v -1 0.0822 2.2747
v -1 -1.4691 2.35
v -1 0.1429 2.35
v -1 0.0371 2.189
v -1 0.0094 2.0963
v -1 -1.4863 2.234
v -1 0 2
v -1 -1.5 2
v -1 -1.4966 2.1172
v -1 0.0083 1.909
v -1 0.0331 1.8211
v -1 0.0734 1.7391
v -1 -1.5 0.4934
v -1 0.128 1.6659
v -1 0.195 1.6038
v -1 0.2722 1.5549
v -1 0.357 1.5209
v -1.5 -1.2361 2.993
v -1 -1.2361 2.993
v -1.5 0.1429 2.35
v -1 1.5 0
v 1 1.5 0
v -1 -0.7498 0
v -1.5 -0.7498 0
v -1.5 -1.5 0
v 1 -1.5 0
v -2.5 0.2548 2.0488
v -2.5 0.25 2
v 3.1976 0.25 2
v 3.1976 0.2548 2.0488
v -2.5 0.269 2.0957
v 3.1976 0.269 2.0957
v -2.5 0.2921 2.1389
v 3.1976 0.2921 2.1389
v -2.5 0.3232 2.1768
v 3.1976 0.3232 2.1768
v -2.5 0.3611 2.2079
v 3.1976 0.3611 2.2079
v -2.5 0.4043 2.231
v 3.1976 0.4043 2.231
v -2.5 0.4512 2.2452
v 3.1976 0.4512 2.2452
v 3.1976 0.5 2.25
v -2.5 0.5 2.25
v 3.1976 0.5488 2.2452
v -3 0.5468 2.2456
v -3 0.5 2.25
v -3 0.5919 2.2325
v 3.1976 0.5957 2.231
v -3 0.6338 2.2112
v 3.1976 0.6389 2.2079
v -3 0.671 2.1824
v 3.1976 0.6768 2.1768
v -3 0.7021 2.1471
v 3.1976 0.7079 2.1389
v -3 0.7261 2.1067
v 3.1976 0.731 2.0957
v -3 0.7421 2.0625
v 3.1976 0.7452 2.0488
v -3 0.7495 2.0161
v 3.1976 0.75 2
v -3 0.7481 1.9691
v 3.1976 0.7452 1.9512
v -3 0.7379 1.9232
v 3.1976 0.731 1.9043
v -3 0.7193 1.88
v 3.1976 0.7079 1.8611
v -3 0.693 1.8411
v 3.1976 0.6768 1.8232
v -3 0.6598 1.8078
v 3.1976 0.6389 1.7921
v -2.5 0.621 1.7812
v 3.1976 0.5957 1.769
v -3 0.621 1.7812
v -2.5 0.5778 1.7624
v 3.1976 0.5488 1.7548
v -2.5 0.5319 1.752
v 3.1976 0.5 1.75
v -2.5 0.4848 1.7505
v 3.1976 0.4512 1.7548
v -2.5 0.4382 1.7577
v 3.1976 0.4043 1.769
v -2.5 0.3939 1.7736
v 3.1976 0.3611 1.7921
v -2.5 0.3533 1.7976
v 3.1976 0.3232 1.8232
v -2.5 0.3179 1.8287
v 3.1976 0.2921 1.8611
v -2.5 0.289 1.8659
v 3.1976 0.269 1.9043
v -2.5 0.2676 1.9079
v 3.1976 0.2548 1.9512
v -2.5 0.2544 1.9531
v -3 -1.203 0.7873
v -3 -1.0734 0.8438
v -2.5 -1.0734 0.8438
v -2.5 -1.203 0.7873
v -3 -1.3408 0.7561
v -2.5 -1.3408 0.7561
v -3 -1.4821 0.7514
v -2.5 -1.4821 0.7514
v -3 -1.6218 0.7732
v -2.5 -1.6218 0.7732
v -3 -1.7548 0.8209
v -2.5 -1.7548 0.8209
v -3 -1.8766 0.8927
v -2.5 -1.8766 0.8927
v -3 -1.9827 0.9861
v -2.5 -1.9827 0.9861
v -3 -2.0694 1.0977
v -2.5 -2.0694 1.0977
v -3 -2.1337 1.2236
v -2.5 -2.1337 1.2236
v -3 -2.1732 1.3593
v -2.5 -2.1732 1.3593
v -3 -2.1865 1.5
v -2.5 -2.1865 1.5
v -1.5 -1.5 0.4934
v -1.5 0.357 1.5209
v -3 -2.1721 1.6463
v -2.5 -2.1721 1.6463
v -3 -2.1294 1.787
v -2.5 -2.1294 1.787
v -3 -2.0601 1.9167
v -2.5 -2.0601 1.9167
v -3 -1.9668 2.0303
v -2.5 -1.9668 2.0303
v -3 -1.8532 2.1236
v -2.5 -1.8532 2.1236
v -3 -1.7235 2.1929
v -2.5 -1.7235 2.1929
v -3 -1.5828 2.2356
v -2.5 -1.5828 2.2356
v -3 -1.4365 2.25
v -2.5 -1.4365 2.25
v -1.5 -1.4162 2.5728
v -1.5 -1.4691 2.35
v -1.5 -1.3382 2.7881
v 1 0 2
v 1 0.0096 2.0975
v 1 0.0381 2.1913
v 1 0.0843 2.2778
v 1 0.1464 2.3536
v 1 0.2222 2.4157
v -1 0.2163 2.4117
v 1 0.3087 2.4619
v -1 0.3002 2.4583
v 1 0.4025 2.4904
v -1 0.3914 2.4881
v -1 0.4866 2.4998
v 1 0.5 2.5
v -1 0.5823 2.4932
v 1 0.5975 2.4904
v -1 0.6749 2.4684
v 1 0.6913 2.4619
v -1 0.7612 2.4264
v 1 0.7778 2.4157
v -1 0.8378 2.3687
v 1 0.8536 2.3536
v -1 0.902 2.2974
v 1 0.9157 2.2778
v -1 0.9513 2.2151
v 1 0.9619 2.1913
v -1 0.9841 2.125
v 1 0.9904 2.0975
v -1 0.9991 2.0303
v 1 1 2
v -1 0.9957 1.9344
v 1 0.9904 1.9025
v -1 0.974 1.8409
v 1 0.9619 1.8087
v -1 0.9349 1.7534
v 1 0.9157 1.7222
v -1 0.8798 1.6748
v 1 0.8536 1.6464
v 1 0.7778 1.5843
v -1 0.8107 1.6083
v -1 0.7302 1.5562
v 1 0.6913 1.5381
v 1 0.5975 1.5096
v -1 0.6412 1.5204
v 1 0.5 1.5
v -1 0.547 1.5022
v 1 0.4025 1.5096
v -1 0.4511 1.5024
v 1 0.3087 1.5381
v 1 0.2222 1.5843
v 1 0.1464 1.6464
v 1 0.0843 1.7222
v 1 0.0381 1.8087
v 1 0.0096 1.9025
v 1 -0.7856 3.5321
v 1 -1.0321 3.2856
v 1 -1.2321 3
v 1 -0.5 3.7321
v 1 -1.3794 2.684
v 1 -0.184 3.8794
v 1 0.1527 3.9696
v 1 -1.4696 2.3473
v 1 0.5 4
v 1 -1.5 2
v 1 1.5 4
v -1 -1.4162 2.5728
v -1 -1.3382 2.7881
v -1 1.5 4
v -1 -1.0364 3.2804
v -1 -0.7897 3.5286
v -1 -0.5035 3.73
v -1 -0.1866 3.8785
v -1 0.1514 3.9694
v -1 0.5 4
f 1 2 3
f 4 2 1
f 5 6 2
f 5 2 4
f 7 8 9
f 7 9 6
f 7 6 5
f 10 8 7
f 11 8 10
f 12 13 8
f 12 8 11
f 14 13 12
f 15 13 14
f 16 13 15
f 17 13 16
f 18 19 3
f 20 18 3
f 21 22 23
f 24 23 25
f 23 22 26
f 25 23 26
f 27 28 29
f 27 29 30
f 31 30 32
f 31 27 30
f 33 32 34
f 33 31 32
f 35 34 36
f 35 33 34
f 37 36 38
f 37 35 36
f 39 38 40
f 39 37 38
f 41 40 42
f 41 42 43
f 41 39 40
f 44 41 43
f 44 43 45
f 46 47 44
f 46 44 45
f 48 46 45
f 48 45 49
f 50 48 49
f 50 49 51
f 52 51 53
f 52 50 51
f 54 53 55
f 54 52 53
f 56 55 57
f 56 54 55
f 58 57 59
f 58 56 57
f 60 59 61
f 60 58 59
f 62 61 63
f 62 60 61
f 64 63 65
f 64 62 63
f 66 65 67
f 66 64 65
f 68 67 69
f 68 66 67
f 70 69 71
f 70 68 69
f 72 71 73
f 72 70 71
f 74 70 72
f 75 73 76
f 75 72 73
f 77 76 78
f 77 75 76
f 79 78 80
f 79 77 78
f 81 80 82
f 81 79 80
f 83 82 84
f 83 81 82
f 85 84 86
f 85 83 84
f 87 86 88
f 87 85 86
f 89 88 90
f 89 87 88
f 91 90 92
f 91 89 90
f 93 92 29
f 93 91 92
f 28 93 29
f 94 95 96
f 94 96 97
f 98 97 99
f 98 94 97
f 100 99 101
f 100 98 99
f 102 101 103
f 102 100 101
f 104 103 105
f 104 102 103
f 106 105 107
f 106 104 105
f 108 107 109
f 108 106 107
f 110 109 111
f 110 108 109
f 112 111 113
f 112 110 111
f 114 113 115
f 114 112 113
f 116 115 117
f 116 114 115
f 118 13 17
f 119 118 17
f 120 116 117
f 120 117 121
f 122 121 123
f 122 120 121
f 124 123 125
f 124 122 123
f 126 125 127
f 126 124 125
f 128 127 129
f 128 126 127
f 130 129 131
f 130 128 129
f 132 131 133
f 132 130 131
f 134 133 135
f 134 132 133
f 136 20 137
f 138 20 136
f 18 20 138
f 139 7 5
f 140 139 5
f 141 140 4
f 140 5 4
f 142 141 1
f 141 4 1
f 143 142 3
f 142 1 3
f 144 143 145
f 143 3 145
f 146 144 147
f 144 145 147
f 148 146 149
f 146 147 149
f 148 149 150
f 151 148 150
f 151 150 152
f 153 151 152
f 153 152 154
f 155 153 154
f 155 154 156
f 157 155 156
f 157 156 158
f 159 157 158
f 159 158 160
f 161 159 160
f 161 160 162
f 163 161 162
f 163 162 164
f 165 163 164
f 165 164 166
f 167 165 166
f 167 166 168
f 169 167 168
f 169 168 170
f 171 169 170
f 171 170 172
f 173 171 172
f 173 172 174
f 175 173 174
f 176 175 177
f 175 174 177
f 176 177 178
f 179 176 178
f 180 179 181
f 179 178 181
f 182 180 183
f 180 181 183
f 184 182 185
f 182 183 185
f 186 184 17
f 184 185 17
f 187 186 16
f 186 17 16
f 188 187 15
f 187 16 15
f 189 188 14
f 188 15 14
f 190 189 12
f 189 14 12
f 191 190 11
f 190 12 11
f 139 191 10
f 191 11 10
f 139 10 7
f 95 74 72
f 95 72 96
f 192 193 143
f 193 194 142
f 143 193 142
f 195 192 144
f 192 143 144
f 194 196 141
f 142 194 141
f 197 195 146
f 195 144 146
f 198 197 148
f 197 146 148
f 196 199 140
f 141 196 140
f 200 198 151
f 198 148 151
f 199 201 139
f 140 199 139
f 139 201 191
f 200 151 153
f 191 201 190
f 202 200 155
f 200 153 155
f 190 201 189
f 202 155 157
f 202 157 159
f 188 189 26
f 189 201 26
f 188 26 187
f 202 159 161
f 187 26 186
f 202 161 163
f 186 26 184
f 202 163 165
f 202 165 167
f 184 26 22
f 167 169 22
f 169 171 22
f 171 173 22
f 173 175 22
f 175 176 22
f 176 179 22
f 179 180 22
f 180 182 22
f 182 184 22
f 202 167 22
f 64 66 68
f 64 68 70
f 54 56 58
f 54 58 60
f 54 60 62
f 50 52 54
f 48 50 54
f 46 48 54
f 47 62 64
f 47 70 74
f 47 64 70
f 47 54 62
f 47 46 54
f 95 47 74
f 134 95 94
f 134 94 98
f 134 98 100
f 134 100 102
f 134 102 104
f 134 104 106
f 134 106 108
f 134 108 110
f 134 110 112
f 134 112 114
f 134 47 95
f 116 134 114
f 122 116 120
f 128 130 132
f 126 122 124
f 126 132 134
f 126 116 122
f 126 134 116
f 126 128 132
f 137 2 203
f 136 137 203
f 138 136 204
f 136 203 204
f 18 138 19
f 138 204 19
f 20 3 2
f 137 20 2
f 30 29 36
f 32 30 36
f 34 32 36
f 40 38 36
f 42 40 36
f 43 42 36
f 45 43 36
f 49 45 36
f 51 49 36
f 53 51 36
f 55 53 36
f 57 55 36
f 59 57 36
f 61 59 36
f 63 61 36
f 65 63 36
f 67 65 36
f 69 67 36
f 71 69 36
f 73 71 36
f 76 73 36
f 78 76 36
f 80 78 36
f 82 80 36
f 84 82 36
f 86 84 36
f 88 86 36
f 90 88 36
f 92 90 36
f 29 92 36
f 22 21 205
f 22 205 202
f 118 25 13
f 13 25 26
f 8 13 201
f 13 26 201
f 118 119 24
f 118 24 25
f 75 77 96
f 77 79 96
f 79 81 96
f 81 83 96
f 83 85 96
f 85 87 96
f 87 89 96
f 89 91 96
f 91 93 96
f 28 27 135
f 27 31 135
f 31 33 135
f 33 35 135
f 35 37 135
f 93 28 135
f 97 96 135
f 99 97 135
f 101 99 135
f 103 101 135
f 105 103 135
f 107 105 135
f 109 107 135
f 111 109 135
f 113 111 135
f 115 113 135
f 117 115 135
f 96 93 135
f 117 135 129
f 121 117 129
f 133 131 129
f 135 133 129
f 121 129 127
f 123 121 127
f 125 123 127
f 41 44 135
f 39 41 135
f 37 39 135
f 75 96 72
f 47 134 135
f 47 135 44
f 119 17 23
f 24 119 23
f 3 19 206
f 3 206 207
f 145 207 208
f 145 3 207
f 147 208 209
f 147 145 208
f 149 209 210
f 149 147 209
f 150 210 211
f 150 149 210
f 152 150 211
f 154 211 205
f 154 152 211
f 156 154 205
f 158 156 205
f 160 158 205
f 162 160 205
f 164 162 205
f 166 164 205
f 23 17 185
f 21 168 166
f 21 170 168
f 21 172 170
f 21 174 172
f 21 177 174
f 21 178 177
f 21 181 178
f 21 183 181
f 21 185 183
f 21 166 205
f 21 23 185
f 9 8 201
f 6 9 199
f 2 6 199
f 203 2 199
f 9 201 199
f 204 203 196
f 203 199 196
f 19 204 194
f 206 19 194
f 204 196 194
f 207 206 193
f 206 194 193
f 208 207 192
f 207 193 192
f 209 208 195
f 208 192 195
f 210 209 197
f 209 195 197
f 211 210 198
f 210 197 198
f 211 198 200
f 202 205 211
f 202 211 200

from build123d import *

# Parameters (mm, degrees)
F0_W      = 2
F0_H      = 3
F1_DEPTH  = 4
F2_R      = 2
F3_R      = 0.5
F4_DEPTH  = 2.001
F6_R      = 0.25
F7_DEPTH  = 6.1976
F9_DEPTH  = 0.5
F11_DEPTH = 0.5


with BuildPart() as f1:
    # F0 (on Top) → F1 (new body)
    with BuildSketch(Plane.XY):
        Rectangle(F0_W, F0_H)
    extrude(amount=F1_DEPTH)

    # F2
    f2_edges = [f1.edges().sort_by_distance(p)[0] for p in [
        (0, -1.5, 4),
    ]]
    fillet(f2_edges, radius=F2_R)

    # F3 (on face) → F4 (cut, through all)
    with BuildSketch(Plane(origin=(-1, 0, 0), x_dir=(0, -1, 0), z_dir=(-1, 0, 0))):
        with Locations((-0.5, 2)):
            Circle(F3_R)
    extrude(amount=-F4_DEPTH, mode=Mode.SUBTRACT)

    # F10 (on face) → F11 (join)
    with BuildSketch(Plane(origin=(-1, 0, 0), x_dir=(0, -1, 0), z_dir=(-1, 0, 0))):
        with BuildLine():
            Line((1.2360557408, 2.9930309486), (-0.1429285786, 2.35))
            Line((-0.1429285786, 2.35), (1.4691368668, 2.35))
            ThreePointArc((1.4691368668, 2.35), (1.3802886121, 2.6815531784), (1.2360557408, 2.9930309486))
        make_face()
        Polygon((1.5, 0.4934333297), (-0.3570055276, 1.5208835414), (0.7498061304, 0), (1.5, 0), align=None)
    extrude(amount=F11_DEPTH)


with BuildPart() as f7:
    # F6 (on offset) → F7 (new body)
    with BuildSketch(Plane(origin=(-3, 0, 0), x_dir=(0, -1, 0), z_dir=(-1, 0, 0))):
        with Locations((-0.5, 2)):
            Circle(F6_R)
    extrude(amount=-F7_DEPTH)

    # F8 (on face) → F9 (join)
    with BuildSketch(Plane(origin=(-3, 0, 0), x_dir=(0, -1, 0), z_dir=(-1, 0, 0))):
        with BuildLine():
            ThreePointArc((-0.6210307296, 1.78125), (-0.3730308746, 1.784642527), (-0.25, 2))
            ThreePointArc((-0.25, 2), (-0.3232233047, 2.1767766953), (-0.5, 2.25))
            ThreePointArc((-0.5, 2.25), (-0.7420614591, 2.0625), (-0.6210307296, 1.78125))
        make_face()
        with BuildLine():
            ThreePointArc((-0.5, 2.25), (-0.3232233047, 2.1767766953), (-0.25, 2))
            ThreePointArc((-0.25, 2), (-0.3730308746, 1.784642527), (-0.6210307296, 1.78125))
            Line((-0.6210307296, 1.78125), (1.0733994844, 0.84375))
            ThreePointArc((1.0733994844, 0.84375), (0.7103072957, 1.6875), (1.4364916731, 2.25))
            Line((1.4364916731, 2.25), (-0.5, 2.25))
        make_face()
        with BuildLine():
            ThreePointArc((2.1864916731, 1.5), (1.966821759, 2.0303300859), (1.4364916731, 2.25))
            ThreePointArc((1.4364916731, 2.25), (0.7103072957, 1.6875), (1.0733994844, 0.84375))
            ThreePointArc((1.0733994844, 0.84375), (1.8173990493, 0.8539275809), (2.1864916731, 1.5))
        make_face()
    extrude(amount=-F9_DEPTH)


solid = Compound([f1.part, f7.part])
